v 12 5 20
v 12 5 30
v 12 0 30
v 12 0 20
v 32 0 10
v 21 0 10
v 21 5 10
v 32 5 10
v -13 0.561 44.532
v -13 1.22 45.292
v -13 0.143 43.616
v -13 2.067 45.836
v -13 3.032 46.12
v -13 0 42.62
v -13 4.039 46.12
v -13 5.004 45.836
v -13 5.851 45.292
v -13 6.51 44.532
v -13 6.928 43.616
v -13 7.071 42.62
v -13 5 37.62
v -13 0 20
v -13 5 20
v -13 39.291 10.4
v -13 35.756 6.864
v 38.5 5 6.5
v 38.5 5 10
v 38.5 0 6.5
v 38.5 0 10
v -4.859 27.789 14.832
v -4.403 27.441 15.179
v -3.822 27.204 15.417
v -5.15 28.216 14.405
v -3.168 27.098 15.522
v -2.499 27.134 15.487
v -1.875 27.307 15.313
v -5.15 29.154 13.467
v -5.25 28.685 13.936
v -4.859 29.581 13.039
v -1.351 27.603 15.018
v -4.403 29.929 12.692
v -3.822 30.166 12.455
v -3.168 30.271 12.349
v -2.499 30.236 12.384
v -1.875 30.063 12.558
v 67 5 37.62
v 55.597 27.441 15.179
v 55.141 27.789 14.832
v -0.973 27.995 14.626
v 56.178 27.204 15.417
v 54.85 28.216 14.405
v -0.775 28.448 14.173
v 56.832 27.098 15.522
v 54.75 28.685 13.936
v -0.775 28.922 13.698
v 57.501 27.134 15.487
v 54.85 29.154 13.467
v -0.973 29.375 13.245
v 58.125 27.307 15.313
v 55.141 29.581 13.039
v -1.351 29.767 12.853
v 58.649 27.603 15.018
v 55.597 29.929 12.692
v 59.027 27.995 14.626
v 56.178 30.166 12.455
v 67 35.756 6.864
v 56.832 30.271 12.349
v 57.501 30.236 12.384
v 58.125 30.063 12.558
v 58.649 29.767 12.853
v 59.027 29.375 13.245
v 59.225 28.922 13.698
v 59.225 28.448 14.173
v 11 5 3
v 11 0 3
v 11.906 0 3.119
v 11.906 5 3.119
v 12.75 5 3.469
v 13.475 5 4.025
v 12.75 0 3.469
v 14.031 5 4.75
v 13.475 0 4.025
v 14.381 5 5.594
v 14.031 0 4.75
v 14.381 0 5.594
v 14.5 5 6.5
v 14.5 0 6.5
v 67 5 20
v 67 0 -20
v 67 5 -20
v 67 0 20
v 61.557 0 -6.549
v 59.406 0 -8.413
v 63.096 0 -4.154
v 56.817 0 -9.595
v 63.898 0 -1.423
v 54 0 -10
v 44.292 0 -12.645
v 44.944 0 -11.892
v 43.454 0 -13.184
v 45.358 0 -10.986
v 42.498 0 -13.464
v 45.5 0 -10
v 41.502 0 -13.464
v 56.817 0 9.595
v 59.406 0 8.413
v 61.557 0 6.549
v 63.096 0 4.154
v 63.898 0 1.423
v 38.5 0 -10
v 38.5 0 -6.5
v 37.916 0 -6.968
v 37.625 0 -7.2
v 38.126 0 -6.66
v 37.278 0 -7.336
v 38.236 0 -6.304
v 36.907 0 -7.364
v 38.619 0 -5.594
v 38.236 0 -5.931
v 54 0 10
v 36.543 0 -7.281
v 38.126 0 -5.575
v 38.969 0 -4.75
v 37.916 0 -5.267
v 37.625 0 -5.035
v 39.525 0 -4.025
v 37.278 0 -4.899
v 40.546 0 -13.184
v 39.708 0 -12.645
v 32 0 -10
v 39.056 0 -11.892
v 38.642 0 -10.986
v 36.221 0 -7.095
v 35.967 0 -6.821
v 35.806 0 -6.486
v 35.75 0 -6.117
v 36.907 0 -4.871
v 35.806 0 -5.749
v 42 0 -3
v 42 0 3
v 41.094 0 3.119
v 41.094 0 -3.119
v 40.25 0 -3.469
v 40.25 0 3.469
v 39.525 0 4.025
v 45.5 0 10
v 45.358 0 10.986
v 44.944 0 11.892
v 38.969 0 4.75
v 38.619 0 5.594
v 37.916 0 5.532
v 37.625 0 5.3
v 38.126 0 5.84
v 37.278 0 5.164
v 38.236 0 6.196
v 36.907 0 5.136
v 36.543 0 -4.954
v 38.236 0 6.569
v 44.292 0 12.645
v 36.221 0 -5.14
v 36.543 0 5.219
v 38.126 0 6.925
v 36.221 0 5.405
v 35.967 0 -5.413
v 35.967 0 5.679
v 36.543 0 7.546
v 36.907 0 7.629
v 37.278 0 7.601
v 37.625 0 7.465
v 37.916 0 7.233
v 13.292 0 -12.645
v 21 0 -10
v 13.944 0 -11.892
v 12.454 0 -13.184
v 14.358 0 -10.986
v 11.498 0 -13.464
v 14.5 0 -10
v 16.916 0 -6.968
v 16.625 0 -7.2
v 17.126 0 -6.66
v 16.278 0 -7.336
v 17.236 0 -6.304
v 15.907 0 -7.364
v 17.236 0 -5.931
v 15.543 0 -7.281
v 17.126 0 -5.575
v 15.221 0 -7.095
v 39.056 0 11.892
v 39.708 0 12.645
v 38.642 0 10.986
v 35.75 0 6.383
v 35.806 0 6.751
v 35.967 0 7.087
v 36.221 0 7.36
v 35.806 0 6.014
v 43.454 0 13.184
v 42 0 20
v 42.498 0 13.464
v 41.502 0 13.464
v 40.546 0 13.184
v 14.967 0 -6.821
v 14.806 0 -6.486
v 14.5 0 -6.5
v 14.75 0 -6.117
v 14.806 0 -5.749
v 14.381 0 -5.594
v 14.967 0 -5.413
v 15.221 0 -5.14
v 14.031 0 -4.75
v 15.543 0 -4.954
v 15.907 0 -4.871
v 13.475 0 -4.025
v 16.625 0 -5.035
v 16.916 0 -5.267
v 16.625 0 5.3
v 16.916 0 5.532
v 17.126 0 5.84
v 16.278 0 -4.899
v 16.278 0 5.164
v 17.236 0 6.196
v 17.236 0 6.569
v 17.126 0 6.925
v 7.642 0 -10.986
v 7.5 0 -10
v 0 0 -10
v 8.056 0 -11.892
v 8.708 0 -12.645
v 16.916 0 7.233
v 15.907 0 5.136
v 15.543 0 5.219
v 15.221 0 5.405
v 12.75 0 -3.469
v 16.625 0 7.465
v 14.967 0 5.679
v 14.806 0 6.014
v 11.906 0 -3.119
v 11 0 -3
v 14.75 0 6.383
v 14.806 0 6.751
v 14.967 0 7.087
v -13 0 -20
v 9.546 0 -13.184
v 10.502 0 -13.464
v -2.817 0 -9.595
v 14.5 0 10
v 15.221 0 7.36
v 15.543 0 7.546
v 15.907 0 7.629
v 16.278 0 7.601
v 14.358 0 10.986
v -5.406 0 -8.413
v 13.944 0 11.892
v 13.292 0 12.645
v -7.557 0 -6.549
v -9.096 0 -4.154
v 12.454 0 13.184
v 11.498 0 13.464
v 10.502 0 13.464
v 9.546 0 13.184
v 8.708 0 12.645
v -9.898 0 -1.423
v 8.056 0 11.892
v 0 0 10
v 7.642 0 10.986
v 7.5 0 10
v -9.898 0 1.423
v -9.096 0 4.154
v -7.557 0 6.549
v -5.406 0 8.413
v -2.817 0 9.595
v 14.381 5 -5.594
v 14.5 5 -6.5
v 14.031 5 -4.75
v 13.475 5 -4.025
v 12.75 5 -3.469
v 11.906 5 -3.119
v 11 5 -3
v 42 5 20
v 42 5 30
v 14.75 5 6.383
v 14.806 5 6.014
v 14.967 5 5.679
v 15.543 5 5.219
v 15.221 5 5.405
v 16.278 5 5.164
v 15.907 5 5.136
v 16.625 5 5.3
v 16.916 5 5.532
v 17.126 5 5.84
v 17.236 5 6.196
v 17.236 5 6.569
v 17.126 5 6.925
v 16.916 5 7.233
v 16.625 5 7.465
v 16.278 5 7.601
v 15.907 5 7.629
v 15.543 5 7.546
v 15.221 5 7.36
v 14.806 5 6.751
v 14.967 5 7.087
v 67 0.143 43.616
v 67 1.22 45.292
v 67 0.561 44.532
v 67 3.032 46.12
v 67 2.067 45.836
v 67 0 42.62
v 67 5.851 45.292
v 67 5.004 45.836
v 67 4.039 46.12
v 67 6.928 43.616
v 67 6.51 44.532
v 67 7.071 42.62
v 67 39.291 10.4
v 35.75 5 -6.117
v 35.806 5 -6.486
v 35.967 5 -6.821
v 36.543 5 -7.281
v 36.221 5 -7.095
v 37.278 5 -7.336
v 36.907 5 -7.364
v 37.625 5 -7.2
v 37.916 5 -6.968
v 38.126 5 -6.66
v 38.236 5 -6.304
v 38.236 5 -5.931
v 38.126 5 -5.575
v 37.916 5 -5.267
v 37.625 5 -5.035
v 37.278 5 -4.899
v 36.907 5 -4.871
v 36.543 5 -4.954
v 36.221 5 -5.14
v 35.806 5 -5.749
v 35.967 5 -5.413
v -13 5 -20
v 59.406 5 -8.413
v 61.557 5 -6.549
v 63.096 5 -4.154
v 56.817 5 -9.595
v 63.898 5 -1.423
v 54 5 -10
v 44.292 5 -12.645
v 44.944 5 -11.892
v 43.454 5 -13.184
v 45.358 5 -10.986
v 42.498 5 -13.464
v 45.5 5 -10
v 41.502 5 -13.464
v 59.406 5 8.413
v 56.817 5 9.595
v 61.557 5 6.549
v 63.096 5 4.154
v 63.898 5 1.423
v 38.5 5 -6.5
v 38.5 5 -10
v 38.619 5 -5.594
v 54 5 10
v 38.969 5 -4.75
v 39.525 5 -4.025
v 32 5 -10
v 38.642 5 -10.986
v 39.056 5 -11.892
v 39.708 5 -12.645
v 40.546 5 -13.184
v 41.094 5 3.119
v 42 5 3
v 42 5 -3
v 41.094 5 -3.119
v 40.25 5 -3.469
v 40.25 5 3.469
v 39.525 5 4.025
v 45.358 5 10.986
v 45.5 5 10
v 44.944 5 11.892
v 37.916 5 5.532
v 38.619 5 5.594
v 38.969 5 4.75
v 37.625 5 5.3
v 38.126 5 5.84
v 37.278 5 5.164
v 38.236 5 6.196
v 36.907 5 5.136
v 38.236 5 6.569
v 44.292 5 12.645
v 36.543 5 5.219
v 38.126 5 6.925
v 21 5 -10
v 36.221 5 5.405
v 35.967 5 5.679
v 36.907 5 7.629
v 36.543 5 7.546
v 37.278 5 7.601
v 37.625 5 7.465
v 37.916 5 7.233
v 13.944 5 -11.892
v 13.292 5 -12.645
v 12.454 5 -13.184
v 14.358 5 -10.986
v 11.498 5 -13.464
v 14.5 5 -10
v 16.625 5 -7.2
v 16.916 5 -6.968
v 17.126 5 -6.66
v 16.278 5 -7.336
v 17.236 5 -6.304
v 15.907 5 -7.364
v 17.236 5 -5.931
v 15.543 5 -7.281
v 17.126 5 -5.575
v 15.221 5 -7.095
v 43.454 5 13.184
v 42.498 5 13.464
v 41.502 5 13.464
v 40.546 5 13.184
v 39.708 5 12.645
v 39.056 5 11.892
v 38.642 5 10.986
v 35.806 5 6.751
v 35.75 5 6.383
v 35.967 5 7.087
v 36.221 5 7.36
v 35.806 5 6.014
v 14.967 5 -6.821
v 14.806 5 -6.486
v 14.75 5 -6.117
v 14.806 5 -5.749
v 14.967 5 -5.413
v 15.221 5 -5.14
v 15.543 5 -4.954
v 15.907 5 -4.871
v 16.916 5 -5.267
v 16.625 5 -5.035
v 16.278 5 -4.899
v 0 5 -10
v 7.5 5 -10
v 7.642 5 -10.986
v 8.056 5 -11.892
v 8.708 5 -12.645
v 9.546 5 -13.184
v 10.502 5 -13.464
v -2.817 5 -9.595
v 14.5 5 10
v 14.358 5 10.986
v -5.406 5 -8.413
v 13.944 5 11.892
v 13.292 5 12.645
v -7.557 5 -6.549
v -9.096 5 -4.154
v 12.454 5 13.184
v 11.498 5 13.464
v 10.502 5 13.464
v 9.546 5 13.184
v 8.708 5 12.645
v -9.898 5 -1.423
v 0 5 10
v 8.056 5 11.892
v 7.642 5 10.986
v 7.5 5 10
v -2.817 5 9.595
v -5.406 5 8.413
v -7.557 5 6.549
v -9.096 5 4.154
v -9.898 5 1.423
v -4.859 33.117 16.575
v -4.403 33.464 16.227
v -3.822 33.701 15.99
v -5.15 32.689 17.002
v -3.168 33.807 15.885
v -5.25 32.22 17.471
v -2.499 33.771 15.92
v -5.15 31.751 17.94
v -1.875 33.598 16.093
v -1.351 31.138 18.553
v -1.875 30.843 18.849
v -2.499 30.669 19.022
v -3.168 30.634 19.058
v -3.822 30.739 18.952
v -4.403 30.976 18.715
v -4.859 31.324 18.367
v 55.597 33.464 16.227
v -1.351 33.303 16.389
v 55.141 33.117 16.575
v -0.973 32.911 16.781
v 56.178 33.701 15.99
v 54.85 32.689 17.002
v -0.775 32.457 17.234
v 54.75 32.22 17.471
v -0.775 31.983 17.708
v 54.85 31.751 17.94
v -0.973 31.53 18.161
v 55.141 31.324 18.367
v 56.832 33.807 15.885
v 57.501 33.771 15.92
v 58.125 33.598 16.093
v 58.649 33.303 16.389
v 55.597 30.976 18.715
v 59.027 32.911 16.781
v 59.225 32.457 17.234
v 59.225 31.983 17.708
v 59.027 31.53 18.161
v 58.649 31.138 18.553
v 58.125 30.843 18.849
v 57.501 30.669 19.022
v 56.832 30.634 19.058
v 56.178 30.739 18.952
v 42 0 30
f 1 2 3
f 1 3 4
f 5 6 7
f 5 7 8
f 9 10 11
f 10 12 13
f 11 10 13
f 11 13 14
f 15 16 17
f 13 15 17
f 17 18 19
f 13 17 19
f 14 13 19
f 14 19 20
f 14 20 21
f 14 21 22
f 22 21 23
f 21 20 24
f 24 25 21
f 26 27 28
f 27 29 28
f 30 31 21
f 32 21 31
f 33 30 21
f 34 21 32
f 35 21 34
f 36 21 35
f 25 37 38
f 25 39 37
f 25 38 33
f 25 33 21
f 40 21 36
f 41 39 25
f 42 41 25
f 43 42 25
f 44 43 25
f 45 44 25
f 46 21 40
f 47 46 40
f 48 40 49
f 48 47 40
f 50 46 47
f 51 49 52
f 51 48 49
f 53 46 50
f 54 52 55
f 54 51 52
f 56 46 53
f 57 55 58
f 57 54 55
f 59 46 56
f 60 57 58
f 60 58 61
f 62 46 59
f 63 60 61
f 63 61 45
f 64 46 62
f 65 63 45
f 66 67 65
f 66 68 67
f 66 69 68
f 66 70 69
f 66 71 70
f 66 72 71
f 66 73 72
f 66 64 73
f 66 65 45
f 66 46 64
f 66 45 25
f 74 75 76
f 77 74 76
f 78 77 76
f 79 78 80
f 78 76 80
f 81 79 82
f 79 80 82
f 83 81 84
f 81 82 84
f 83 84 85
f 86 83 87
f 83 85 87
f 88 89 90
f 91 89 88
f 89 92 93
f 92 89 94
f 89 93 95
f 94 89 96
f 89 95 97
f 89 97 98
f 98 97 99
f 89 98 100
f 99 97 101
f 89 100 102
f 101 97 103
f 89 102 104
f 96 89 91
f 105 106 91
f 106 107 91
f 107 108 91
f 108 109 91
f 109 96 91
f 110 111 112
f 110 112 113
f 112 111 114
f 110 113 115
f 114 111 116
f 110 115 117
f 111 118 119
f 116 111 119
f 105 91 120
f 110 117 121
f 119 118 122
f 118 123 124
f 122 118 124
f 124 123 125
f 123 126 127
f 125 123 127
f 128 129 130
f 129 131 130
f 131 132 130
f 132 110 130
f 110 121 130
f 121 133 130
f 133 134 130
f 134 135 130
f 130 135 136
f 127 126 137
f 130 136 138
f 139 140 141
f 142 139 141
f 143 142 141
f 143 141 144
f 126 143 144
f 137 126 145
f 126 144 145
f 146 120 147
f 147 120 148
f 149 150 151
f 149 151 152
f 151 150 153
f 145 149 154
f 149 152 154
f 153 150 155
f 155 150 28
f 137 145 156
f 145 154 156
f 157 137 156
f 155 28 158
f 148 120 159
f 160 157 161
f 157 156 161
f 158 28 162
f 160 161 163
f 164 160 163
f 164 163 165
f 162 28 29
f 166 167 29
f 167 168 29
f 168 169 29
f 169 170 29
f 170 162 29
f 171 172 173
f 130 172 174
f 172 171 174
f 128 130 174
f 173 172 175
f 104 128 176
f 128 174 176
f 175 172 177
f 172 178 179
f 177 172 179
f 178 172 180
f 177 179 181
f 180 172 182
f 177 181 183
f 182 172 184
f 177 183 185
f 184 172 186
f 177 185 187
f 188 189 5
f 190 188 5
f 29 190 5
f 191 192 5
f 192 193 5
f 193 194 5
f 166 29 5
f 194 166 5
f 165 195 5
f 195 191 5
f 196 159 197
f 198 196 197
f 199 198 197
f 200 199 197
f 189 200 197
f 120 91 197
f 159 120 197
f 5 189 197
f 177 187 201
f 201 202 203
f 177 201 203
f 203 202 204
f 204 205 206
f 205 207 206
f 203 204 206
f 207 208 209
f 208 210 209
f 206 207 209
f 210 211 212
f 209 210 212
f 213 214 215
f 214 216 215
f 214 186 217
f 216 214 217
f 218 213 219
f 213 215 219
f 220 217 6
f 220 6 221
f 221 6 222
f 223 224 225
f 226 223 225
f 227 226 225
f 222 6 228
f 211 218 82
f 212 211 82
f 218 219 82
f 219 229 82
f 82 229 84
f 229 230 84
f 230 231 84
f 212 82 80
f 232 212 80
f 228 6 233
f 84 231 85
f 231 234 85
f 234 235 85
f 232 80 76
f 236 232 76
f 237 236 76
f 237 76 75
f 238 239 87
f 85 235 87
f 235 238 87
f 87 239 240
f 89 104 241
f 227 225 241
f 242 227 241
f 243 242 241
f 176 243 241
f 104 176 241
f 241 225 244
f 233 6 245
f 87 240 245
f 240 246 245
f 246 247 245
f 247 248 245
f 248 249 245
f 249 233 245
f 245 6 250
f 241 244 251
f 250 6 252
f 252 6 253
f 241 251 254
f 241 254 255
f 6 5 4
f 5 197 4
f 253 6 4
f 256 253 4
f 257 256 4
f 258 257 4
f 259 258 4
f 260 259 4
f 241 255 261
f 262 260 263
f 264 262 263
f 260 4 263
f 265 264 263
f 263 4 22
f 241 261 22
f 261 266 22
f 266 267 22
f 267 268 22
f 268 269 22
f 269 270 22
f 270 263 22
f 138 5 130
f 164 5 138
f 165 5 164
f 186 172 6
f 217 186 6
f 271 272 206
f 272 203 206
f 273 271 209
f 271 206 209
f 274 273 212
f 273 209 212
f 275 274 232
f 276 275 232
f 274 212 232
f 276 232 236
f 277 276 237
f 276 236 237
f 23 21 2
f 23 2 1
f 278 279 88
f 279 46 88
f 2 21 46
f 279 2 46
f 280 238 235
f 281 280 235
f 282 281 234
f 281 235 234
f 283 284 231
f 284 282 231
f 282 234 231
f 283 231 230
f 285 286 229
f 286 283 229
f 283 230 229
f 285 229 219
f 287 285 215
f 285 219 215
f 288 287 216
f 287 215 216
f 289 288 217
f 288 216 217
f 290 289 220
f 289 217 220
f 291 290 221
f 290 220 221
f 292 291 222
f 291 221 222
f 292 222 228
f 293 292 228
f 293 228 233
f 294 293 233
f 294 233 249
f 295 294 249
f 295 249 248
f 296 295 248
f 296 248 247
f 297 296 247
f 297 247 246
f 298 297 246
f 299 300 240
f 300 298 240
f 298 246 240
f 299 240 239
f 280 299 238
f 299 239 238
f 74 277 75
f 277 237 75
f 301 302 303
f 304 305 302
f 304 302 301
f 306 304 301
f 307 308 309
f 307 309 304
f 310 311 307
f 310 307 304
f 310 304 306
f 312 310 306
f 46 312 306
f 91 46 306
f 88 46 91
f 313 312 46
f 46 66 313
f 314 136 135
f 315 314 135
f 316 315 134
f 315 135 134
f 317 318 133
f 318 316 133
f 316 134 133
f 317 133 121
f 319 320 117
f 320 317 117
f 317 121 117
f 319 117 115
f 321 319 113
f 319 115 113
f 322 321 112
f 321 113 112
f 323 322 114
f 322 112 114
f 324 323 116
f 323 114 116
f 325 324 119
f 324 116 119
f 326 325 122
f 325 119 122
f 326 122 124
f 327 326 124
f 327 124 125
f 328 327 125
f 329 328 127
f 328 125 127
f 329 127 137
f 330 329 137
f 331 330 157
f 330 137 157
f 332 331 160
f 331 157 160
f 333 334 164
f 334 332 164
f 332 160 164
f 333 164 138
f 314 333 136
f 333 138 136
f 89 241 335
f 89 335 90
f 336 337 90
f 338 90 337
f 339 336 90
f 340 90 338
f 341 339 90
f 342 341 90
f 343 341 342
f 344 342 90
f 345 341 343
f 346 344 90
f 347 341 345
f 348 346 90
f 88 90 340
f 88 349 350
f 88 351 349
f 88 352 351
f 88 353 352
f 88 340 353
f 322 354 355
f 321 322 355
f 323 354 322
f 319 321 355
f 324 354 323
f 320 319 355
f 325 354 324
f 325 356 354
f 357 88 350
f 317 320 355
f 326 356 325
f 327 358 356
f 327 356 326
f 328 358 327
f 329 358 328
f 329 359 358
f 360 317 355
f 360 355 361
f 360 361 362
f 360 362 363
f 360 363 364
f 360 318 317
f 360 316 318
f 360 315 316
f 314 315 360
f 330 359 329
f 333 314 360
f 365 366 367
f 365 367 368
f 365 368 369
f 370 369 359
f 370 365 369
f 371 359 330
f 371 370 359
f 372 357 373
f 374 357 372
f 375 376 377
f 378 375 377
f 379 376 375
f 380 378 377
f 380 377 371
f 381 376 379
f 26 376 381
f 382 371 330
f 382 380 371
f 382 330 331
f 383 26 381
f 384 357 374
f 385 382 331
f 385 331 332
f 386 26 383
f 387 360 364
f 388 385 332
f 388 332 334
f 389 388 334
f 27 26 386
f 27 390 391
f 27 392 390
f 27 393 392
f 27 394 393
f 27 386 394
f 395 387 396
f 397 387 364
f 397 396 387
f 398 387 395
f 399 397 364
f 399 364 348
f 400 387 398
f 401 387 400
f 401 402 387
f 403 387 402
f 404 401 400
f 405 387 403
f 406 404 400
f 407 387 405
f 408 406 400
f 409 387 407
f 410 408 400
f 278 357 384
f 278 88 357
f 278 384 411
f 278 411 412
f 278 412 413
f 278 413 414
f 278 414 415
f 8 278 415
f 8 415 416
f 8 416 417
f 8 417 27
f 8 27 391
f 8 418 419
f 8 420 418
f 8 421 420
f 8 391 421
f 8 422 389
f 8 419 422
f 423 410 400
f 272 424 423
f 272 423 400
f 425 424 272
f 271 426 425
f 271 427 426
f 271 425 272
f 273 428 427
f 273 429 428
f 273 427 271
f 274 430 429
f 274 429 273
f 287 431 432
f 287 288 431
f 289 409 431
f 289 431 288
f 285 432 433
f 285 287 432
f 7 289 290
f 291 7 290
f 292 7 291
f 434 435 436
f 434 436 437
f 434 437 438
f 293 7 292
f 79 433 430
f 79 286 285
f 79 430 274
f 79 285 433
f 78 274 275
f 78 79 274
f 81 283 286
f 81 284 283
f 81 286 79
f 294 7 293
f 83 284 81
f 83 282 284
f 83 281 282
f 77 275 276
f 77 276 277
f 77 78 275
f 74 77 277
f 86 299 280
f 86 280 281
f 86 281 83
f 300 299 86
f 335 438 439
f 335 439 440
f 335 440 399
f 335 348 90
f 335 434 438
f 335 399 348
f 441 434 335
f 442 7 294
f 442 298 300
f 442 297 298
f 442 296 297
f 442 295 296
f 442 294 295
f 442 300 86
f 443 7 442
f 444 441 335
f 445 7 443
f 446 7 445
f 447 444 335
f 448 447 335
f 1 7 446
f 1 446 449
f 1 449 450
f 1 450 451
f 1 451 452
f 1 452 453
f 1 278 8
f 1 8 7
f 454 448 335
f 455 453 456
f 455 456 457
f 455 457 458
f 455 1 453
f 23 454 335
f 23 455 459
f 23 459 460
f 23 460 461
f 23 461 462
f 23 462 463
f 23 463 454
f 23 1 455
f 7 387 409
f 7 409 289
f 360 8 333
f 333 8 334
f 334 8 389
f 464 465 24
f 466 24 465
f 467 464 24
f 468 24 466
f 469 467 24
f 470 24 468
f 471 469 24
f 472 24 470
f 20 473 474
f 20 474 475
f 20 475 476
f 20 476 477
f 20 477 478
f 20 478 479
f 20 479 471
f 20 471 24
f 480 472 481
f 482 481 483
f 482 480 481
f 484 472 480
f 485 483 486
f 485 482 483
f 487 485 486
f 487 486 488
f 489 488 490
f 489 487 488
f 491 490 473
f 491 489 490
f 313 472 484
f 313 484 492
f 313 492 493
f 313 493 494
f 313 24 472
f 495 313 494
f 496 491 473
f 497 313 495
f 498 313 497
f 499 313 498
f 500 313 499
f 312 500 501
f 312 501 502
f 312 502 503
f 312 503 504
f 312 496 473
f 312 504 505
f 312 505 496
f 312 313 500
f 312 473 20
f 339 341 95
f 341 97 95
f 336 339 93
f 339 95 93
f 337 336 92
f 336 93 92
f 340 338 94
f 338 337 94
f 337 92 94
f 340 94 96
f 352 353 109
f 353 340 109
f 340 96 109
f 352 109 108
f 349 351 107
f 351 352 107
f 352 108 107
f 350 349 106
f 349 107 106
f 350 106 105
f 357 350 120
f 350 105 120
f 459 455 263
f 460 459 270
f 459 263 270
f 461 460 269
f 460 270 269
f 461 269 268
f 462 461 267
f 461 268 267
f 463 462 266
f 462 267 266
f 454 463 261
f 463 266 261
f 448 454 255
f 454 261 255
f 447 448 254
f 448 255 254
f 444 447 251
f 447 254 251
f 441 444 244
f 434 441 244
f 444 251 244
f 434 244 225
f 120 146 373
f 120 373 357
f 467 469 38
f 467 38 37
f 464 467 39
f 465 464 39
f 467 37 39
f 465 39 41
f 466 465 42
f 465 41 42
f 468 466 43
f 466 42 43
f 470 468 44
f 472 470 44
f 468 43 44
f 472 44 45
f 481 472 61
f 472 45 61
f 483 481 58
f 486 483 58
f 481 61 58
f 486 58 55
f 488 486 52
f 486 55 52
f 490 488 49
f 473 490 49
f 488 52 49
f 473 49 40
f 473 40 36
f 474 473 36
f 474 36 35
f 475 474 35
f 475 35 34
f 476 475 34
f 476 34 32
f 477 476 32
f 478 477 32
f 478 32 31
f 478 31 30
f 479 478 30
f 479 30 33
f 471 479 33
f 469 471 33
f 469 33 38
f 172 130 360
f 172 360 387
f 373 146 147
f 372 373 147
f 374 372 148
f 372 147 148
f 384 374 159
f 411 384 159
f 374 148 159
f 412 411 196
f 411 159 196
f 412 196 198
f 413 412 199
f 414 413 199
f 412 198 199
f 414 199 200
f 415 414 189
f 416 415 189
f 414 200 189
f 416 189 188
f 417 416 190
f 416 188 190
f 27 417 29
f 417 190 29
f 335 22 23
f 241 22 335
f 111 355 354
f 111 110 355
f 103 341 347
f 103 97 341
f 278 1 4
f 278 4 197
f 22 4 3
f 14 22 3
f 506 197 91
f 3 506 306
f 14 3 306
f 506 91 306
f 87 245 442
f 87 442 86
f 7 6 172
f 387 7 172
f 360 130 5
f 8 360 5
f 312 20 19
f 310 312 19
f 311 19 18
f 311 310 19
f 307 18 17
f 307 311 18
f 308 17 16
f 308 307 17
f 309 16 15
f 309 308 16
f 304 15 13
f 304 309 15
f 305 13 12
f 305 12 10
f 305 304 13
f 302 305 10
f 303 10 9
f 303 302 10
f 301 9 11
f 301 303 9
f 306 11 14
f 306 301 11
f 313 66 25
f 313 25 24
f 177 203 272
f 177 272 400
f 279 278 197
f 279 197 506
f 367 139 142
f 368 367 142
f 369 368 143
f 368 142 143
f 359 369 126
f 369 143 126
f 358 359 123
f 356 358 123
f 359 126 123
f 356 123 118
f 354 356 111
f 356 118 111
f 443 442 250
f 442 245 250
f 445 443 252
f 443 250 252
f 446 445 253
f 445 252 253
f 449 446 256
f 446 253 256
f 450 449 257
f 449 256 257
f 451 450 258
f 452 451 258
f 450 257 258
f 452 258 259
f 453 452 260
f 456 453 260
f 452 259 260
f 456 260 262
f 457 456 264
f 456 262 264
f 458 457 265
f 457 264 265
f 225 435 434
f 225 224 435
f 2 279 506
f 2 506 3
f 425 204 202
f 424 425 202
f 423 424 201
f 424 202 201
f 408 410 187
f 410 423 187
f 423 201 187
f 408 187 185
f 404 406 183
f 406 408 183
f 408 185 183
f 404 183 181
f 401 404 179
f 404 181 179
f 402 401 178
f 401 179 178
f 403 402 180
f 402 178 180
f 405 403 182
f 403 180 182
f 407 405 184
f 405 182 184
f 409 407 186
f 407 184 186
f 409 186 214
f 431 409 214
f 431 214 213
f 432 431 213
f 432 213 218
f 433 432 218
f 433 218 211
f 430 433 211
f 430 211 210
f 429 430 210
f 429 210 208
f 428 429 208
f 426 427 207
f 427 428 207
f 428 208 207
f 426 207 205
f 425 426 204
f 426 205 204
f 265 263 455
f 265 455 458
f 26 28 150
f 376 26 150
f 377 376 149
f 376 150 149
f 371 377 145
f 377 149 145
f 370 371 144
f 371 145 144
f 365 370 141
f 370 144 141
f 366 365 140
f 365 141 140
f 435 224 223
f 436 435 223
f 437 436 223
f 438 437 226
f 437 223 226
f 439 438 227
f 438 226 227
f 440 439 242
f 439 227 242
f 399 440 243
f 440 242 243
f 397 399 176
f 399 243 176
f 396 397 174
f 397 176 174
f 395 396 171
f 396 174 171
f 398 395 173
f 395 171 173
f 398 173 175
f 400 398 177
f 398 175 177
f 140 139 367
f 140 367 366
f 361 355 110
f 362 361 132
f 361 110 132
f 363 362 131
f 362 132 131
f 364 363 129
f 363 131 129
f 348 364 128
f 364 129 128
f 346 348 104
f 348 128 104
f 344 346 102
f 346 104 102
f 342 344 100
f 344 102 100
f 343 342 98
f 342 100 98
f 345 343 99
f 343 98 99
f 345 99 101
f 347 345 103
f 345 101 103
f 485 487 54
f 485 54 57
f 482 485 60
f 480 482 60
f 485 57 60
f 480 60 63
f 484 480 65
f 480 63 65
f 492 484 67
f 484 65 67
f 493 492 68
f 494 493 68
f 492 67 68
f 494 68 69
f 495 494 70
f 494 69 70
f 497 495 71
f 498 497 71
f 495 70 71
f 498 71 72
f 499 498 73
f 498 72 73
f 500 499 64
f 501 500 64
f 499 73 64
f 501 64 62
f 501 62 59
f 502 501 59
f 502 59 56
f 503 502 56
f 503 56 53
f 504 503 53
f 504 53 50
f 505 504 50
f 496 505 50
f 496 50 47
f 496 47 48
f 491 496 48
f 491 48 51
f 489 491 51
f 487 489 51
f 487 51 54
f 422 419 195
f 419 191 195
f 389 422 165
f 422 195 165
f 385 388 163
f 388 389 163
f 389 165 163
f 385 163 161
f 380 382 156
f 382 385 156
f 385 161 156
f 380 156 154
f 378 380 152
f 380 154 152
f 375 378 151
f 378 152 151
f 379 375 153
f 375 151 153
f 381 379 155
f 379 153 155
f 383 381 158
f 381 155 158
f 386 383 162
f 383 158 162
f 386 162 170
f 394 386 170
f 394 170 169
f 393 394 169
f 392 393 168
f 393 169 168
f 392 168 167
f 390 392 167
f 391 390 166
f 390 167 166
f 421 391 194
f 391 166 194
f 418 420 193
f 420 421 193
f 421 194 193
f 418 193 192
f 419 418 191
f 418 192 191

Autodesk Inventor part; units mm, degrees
ref_plane "YZ Plane" through (0, 0, 0) normal (1, 0, 0) x (0, 1, 0)
ref_plane "XZ Plane" through (0, 0, 0) normal (0, 1, 0) x (-1, 0, 0)
ref_plane "XY Plane" through (0, 0, 0) normal (0, 0, 1) x (1, 0, 0)
sketch "Sketch1" plane through (0, 0, 0) normal (0, 1, 0) x (-1, 0, 0)
  circle A0 centre (0, 0) radius 10
  circle A1 centre (-54, 0) radius 10
  line L0 (-54, -10) -> (0, -10)
  line L1 (0, 10) -> (-54, 10)
  circle A2 centre (-16, -6.1173) radius 1.25
  circle A3 centre (-37, -6.1173) radius 1.25
  circle A4 centre (-37, 6.3827) radius 1.25
  circle A5 centre (-16, 6.3827) radius 1.25
  line L2 (-11, -10) -> (-11, 10)
  line L3 (-21, 10) -> (-21, -10)
  line L4 (-32, -10) -> (-32, 10)
  line L5 (-42, -10) -> (-42, 10)
  line L6 (13, -20) -> (-67, -20)
  line L7 (-67, -20) -> (-67, 20)
  line L8 (-67, 20) -> (13, 20)
  line L9 (13, 20) -> (13, -20)
  dimension "d0" = 20
  dimension "d1" = 20
  dimension "d2" = 54
  dimension "d3" = 21
  dimension "d4" = 12.5
  dimension "d5" = 12.5
  dimension "d6" = 21
  dimension "d7" = 2.5
  dimension "d8" = 2.5
  dimension "d9" = 2.5
  dimension "d10" = 2.5
  dimension "d11" = 5
  dimension "d12" = 5
  dimension "d13" = 5
  dimension "d14" = 5
  dimension "d15" = 11
  dimension "d16" = 11
  dimension "d17" = 40
  dimension "d18" = 80
  dimension "d19" = 13
  dimension "d20" = 20
extrude "Extrusion1" add sketch "Sketch1" along normal blind 5 contours L2 L0 L3 L1 | L4 L0 L5 L1 | L6 L7 L8 L9
sketch "Sketch2" plane through (67, 0, 20) normal (1, 0, 0) x (0, 0, -1)
  line L0 (0, 0) -> (-17.6204, 0)
  line L1 (-17.6204, 0) -> (-17.6204, 5)
  line L2 (-17.6204, 5) -> (0, 5)
  line L3 (0, 5) -> (0, 0)
  line L4 (-17.6204, 5) -> (13.1355, 35.7559)
  line L5 (13.1355, 35.7559) -> (9.5999, 39.2914)
  line L6 (9.5999, 39.2914) -> (-22.6204, 7.0711)
  line L7 (-22.6204, 7.0711) -> (-22.6204, 0)
  line L8 (-22.6204, 0) -> (-17.6204, 0)
  circle A0 centre (-22.6204, 3.5355) radius 3.5355
  point P0 (-22.6204, 0)
  dimension "d23" = 45
  dimension "d24" = 5
  dimension "d25" = 5
extrude "Extrusion2" add sketch "Sketch2" against normal blind 80
sketch "Sketch3" plane through (0, 5, 0) normal (0, 1, 0) x (1, 0, 0)
  line L0 (12, -20) -> (42, -20)
  line L1 (42, -20) -> (42, -30)
  line L2 (42, -30) -> (12, -30)
  line L3 (12, -30) -> (12, -20)
  line L4 (-13, 20) -> (-13, -37.6204) projected
  line L5 (11, -10) -> (0, -10) projected
  point P0 (0, 0)
  dimension "d28" = 30
  dimension "d29" = 10
  dimension "d30" = 25
  dimension "d31" = 10
extrude "Extrusion3" cut sketch "Sketch3" against normal blind 80
sketch "Sketch4" plane through (67, 5, 37.6204) normal (0, -0.7071, -0.7071) x (-1, 0, 0)
  circle A0 centre (73.7126, 34.5024) radius 2.2513
  circle A1 centre (10, 33.4954) radius 2.25
  line L0 (0, 0) -> (0, 43.4954) projected
  line L1 (0, 43.4954) -> (80, 43.4954) projected
  circle A2 centre (70, 33.4954) radius 2.25
  line L2 (80, 37.2082) -> (80, -7.0711) projected
  point P0 (67, 23.0661)
  point P1 (71.5496, 35.1267)
  point P2 (72.1615, 32.8706)
  dimension "d34" = 10
  dimension "d35" = 10
  dimension "d36" = 4.5
  dimension "d37" = 10
  dimension "d38" = 10
  dimension "d39" = 4.5
extrude "Extrusion4" cut sketch "Sketch4" against normal blind 80 contours A2 A0 | A0 A2 | A1 picked at (71.7698, 33.9272) picked at (69.1023, 33.1672)
sketch "Sketch5" plane through (0, 0, 0) normal (0, -1, 0) x (1, 0, 0)
  line L0 (42, 10) -> (42, -10) projected
  circle A0 centre (42, -10) radius 3.5
  circle A1 centre (42, 10) radius 3.5
  line L1 (11, -10) -> (11, 10) projected
  circle A2 centre (11, 10) radius 3.5
  circle A3 centre (11, -10) radius 3.5
  line L2 (0, -10) -> (11, -10) projected
  line L3 (42, -10) -> (54, -10) projected
  circle A4 centre (42, -6.5) radius 3.5
  circle A5 centre (42, 6.5) radius 3.5
  circle A6 centre (11, 6.5) radius 3.5
  circle A7 centre (11, -6.5) radius 3.5
  line L4 (14.5, -6.5) -> (14.5, -6.5)
  line L5 (14.5, -6.5) -> (14.5, -10)
  line L6 (14.5, -10) -> (14.5, -10)
  line L7 (14.5, -10) -> (14.5, -6.5)
  line L8 (14.5, 10) -> (14.5, 6.5)
  line L9 (38.5, -10) -> (38.5, -6.5)
  line L10 (38.5, 10) -> (38.5, 6.5)
  point P0 (0, 0)
  point P1 (11, -3)
  point P2 (11, 6.5)
  point P3 (42, 9)
  point P4 (42, -3)
  point P5 (7.5, -10)
  point P6 (45.5, -10)
  point P7 (7.9689, 8.25)
  point P8 (7.9689, -8.25)
  point P9 (42, -3)
  point P10 (45.0311, 8.25)
  dimension "d42" = 7
  dimension "d43" = 7
  dimension "d44" = 7
  dimension "d45" = 7
  dimension "d46" = 20
  dimension "d47" = 0
  dimension "d48" = 20
  dimension "d49" = 0
extrude "Extrusion5" cut sketch "Sketch5" against normal blind 6 contours A5 A1 L0 | A5 A1 | L0 A1 A5 | A1 A5 L0 | L0 A5 A1 | L0 A0 A4 | A5 L10 A1 | A0 A4 L0 | L0 A4 A0 | A4 A0 L9 | A4 A0 L3 | L3 A0 A4 | A7 A3 L1 | A7 A3 L2 | L2 A3 A7 | L1 A3 A7 | A3 A7 L1 | L1 A7 A3 | A6 A2 L1 | L1 A2 A6 | A7 L5 A3 | A2 A6 L1 | L1 A6 A2 | A2 A6 | A6 A2 L8 picked at (41.7404, -4.1959) picked at (42.2426, -8.8078) picked at (41.7574, -7.6922)
equation "\"d5\" = d4"
equation "\"d6\" = d3"
equation "\"d39\" = d36"
equation "\"d43\" = d42"
equation "\"d44\" = d42"
equation "\"d45\" = d42"
properties part number "CameraBracket"
